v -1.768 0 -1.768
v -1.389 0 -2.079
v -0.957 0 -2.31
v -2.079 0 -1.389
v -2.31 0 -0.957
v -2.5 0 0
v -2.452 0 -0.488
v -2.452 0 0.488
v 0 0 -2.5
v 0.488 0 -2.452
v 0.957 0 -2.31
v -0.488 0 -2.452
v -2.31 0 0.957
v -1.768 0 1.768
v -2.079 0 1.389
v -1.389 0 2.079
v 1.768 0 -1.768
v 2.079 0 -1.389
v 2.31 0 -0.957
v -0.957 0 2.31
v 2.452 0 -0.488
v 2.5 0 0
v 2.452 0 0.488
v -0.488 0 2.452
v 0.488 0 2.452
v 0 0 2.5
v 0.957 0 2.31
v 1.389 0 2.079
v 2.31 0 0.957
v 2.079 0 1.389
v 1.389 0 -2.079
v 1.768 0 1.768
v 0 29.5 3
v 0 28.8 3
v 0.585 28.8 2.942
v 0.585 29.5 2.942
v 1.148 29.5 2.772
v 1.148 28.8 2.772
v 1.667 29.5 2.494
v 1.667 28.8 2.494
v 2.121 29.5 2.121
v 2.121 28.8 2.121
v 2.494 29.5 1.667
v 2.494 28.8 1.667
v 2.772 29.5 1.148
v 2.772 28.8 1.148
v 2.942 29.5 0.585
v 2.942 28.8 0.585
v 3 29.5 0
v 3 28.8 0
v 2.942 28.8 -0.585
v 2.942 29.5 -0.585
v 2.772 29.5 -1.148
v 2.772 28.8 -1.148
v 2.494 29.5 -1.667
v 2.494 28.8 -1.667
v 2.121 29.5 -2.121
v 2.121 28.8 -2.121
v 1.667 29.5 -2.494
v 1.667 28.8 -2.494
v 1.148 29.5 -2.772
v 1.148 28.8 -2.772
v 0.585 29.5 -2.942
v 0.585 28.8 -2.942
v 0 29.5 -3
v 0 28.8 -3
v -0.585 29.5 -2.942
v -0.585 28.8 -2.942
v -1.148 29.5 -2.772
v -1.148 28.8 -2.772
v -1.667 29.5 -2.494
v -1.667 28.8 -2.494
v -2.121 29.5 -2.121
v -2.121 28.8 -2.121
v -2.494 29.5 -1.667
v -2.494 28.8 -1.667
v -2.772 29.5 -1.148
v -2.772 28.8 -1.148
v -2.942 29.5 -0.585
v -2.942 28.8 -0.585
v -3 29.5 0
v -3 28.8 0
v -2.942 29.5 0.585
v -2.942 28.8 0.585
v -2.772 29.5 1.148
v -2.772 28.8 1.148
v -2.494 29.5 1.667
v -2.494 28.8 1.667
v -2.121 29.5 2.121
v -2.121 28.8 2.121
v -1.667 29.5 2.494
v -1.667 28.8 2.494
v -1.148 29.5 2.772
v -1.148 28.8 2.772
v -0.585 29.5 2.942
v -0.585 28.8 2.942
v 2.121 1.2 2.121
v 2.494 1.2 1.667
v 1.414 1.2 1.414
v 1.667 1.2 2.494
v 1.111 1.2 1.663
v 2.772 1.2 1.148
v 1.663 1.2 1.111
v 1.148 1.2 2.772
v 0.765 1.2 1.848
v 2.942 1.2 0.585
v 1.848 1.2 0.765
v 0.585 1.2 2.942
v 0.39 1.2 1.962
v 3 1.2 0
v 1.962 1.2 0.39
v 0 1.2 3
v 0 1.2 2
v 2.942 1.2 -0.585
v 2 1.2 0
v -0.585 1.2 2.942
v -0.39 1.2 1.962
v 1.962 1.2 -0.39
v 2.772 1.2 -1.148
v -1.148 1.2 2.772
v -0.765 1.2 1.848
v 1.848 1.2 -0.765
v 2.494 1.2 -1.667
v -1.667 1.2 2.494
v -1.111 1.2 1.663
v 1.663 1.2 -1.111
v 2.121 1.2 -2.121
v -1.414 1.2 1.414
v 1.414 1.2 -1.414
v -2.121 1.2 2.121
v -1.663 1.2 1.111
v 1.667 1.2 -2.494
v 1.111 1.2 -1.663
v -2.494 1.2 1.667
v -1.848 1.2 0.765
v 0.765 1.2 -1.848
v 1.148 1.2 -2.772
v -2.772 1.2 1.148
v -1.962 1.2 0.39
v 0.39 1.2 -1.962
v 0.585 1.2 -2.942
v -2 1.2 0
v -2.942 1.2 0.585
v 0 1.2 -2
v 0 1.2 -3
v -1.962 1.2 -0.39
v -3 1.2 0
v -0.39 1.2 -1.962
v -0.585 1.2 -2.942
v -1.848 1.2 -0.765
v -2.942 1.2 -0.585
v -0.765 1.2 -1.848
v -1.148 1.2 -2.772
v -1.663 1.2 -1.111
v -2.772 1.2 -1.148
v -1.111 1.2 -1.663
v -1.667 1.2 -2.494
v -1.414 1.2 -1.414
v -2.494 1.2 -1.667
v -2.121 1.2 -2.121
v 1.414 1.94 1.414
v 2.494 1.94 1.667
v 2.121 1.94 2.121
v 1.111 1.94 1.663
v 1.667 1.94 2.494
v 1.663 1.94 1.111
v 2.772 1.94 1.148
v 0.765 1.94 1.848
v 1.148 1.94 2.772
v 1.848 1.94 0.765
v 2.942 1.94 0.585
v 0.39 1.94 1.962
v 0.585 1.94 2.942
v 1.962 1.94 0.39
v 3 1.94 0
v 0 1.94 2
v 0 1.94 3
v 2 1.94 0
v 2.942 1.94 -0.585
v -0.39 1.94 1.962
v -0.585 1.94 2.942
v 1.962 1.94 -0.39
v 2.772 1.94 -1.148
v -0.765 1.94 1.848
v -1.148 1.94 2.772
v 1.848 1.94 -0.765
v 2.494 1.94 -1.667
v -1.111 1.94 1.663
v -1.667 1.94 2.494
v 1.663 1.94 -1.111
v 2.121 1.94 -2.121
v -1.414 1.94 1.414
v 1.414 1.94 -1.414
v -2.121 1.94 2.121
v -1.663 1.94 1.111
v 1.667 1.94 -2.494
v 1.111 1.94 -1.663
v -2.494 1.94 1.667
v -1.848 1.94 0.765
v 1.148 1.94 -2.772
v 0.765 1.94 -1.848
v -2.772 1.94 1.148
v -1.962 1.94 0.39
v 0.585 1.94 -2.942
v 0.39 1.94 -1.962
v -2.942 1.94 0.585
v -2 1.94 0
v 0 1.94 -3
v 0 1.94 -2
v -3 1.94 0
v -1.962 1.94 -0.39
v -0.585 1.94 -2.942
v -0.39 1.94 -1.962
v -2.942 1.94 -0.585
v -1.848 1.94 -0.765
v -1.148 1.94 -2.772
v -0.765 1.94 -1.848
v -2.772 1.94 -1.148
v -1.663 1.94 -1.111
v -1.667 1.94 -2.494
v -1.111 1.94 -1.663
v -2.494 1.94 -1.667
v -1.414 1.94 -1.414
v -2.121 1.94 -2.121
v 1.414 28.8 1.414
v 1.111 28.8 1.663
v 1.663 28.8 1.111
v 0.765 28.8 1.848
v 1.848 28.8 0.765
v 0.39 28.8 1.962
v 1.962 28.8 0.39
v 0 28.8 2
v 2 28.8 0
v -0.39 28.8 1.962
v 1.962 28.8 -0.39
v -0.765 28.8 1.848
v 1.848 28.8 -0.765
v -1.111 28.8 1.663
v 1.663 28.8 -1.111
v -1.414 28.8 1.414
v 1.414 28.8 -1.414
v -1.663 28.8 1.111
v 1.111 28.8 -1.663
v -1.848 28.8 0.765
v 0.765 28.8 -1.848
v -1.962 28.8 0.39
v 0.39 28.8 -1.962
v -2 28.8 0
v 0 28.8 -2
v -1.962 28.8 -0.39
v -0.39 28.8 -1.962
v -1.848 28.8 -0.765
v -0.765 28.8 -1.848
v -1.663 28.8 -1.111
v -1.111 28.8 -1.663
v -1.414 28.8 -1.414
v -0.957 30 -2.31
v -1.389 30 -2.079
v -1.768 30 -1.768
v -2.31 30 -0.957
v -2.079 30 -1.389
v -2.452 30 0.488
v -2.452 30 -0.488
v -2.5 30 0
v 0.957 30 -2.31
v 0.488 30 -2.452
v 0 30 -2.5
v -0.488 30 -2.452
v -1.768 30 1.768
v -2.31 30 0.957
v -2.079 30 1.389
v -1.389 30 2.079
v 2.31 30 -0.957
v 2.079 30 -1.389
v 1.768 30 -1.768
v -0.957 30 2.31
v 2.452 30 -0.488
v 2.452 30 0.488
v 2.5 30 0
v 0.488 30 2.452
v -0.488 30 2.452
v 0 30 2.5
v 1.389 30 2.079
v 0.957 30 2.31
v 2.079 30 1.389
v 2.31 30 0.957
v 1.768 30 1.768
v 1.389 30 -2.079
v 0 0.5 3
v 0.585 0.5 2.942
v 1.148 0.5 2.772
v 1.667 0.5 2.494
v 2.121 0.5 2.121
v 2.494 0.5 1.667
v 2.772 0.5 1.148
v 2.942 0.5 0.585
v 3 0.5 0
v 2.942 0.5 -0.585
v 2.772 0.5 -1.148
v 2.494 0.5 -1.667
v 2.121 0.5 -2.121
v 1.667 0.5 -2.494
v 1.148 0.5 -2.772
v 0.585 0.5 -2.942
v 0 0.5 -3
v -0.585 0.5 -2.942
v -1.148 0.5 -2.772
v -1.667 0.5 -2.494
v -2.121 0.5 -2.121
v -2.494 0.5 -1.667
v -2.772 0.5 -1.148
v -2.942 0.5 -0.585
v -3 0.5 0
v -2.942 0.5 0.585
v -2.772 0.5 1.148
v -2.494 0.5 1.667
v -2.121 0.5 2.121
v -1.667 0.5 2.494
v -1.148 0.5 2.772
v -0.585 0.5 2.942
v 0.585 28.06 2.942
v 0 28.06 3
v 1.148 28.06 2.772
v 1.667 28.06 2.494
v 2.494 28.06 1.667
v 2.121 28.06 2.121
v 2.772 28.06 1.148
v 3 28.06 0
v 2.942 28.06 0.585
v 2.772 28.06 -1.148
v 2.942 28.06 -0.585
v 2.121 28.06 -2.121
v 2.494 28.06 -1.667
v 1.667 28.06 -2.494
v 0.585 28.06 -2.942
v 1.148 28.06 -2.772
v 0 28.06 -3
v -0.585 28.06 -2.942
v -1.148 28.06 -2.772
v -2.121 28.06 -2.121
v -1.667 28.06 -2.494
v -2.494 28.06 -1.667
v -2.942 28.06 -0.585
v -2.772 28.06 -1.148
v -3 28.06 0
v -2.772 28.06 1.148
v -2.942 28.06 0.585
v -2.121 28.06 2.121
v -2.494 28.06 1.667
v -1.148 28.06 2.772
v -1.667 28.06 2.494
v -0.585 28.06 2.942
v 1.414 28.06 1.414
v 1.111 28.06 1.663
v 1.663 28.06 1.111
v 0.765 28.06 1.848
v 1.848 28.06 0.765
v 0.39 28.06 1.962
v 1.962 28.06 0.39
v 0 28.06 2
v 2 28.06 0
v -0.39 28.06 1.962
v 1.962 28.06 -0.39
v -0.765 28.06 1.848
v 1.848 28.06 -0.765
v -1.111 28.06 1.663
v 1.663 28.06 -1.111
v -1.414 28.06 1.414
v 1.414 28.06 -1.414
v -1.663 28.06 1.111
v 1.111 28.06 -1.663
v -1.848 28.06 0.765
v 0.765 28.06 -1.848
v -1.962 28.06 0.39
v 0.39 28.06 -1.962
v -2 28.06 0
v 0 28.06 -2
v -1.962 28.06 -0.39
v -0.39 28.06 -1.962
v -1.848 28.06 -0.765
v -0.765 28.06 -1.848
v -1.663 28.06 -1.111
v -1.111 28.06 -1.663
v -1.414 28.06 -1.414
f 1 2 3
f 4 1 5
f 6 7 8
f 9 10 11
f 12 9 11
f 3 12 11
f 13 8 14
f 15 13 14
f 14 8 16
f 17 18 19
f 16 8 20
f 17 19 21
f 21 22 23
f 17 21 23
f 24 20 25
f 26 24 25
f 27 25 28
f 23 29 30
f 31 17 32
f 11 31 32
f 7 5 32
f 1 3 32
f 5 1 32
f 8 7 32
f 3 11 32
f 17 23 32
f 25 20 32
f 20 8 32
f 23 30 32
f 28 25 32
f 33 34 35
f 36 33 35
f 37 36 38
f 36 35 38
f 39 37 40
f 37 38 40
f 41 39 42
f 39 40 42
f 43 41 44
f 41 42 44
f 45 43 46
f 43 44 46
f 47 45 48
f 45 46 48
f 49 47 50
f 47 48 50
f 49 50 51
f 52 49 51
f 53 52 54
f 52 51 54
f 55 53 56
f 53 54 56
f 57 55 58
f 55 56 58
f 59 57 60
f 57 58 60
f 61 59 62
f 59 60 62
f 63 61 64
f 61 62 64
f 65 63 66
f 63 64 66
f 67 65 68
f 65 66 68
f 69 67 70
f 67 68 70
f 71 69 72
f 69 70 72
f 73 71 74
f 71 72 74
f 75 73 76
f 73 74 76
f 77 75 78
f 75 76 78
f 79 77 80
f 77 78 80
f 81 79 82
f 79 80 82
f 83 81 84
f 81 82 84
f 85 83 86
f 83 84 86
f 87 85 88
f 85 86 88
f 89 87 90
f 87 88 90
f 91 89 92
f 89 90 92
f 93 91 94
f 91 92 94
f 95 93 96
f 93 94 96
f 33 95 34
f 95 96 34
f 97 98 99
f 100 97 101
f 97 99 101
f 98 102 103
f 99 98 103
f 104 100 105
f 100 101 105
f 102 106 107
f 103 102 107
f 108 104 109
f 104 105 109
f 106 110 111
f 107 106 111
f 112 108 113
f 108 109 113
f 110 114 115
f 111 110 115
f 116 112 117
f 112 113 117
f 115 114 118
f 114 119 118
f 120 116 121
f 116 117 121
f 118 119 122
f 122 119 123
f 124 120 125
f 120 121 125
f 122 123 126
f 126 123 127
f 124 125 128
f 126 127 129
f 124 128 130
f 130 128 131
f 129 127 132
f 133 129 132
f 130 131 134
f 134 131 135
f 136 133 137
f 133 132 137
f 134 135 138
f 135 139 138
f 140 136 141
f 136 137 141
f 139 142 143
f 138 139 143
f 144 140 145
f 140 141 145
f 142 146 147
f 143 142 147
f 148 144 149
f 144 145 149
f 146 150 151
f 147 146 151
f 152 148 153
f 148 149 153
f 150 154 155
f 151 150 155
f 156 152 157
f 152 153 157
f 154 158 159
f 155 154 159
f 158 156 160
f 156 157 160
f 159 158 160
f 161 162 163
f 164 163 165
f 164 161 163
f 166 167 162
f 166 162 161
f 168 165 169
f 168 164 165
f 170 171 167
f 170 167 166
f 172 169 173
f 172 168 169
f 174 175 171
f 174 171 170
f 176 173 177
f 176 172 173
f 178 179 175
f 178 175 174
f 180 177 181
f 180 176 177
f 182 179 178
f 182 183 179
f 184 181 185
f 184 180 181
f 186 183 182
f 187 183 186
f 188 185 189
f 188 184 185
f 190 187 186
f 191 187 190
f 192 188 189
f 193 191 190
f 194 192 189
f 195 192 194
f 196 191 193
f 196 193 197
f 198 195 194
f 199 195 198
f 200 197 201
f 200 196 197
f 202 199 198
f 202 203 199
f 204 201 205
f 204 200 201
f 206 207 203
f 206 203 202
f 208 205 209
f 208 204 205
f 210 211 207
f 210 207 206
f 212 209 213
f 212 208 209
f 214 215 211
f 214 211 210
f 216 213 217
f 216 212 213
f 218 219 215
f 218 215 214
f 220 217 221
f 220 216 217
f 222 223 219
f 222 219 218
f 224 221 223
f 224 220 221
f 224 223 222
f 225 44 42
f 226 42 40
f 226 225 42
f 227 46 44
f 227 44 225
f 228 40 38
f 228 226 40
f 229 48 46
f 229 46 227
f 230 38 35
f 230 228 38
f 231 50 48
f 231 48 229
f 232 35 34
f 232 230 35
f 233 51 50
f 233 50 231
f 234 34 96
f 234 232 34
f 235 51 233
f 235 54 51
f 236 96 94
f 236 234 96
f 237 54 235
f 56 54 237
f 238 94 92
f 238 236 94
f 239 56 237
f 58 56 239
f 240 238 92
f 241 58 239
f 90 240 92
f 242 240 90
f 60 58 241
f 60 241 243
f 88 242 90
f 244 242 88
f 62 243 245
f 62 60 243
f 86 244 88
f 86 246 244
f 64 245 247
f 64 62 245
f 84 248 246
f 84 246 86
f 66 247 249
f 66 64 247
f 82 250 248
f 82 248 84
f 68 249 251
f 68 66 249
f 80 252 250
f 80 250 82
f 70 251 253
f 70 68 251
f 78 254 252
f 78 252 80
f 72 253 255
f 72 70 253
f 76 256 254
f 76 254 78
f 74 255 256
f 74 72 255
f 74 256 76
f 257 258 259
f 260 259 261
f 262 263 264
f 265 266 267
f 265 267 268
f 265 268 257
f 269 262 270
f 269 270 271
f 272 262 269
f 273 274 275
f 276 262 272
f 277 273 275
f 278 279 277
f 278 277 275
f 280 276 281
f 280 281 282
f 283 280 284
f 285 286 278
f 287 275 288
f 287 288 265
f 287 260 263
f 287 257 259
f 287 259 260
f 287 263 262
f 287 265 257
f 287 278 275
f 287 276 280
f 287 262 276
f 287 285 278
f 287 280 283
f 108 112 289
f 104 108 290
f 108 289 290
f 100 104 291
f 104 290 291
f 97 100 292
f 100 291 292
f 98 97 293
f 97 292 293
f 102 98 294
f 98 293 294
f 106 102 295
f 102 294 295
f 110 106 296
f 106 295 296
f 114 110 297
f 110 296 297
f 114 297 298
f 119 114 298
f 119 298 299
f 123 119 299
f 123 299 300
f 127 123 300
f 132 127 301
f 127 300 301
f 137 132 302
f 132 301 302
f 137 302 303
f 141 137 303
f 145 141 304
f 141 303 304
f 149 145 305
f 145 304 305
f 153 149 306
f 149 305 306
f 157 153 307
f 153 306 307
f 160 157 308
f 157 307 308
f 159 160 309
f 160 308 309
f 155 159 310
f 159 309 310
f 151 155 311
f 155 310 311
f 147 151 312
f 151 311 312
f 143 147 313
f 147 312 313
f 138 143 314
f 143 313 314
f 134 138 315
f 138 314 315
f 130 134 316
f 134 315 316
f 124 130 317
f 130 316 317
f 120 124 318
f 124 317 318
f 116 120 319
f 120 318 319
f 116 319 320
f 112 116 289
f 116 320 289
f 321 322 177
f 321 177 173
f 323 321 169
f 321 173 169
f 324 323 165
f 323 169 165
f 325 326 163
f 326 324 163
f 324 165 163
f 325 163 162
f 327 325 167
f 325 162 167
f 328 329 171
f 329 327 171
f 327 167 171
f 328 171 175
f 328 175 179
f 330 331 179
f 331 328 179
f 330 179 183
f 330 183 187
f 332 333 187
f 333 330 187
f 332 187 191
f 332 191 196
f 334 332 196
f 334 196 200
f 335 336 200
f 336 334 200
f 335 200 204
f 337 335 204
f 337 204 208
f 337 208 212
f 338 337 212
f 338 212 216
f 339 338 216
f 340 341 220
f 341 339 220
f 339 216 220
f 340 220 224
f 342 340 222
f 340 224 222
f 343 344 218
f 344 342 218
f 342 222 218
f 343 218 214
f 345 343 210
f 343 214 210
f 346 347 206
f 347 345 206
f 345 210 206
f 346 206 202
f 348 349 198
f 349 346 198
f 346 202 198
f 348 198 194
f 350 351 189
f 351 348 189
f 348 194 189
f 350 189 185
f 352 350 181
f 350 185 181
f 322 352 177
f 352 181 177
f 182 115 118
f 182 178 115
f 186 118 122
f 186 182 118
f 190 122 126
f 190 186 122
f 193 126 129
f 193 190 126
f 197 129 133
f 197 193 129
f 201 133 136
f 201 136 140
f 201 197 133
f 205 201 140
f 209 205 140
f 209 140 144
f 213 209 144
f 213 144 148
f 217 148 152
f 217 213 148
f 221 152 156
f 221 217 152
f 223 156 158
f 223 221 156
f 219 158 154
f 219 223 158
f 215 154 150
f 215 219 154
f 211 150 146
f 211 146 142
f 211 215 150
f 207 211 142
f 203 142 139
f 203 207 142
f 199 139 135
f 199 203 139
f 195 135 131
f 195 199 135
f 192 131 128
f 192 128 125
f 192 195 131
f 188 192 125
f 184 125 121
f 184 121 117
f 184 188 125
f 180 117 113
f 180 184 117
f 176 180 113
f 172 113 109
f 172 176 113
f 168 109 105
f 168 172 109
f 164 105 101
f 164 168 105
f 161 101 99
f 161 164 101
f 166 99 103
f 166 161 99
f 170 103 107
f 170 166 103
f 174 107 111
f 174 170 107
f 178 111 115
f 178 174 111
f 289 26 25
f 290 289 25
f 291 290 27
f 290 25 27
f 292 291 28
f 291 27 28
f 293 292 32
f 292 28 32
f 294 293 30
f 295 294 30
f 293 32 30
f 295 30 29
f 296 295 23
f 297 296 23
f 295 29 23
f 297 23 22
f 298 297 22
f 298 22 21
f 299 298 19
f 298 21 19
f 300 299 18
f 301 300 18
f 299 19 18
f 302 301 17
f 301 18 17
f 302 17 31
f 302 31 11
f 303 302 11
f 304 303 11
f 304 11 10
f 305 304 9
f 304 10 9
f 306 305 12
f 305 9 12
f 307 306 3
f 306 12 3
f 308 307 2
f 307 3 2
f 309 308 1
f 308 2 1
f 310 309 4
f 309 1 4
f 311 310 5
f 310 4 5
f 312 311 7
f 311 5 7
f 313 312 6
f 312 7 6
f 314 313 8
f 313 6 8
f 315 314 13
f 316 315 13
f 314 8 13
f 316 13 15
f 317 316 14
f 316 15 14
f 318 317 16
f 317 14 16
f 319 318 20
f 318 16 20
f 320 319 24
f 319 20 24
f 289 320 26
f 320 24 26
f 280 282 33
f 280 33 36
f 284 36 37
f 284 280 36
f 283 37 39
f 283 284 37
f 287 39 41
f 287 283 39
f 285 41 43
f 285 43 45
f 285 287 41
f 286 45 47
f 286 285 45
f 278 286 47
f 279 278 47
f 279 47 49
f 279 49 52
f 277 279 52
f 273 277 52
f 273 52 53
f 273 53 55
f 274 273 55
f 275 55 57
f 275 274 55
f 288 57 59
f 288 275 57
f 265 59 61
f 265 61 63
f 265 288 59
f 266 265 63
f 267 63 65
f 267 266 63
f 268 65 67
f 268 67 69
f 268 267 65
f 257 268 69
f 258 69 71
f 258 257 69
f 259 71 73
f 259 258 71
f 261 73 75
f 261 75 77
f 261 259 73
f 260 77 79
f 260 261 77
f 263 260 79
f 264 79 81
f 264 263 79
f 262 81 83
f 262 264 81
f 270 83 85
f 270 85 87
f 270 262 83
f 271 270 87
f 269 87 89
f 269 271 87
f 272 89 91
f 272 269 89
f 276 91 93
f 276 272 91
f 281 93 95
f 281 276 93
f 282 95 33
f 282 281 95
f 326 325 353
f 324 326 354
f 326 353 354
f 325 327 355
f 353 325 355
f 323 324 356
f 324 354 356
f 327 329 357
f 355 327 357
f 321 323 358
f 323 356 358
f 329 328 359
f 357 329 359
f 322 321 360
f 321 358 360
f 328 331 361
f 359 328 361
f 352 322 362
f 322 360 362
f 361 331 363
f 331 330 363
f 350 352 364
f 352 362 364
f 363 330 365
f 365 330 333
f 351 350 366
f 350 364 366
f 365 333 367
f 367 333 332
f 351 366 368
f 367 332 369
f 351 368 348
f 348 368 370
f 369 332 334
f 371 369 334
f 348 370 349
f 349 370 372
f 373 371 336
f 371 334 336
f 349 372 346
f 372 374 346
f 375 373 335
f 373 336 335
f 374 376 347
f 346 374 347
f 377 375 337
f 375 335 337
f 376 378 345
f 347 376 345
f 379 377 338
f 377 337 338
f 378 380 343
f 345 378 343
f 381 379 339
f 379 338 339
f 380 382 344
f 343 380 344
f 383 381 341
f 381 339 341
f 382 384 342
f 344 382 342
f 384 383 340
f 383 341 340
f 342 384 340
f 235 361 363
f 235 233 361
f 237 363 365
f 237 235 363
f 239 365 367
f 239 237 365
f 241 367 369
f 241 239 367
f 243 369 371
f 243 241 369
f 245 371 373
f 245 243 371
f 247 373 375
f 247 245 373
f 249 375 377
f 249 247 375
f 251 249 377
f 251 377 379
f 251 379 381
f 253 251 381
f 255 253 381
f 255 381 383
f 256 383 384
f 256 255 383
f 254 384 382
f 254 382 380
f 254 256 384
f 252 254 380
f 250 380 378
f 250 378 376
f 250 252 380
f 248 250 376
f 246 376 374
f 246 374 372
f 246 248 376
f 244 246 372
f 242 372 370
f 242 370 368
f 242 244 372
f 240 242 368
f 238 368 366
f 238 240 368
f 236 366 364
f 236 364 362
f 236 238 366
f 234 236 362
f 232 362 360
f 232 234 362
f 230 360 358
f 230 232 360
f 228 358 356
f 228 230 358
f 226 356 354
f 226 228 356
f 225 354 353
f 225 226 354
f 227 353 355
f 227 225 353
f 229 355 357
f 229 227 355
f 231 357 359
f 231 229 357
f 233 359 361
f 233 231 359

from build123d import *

# Parameters (mm, degrees)
SKETCH1_R           = 3
BOSS_EXTRUDE1_DEPTH = 30
SKETCH2_W           = 1
SKETCH2_H           = 0.74
CHAMFER1_SIZE       = 0.5


with BuildPart() as part:
    # Sketch1 → Boss-Extrude1 (new body)
    with BuildSketch(Plane(origin=(0, 0, 0), x_dir=(1, 0, 0), z_dir=(0, 1, 0))):
        with Locations(Location((0, 0, 0), (0, 0, 270))):
            Circle(SKETCH1_R)
    extrude(amount=BOSS_EXTRUDE1_DEPTH)

    # Sketch2 → Cut-Revolve1 (revolve, cut)
    with BuildSketch(Plane.XY):
        with Locations((2.5, 28.43)):
            Rectangle(SKETCH2_W, SKETCH2_H)
        with Locations((2.5, 1.57)):
            Rectangle(SKETCH2_W, SKETCH2_H)
    revolve(axis=Axis((0, -1000, 0), (0, 1, 0)), mode=Mode.SUBTRACT)

    # Chamfer1
    chamfer1_edges = [part.edges().sort_by_distance(p)[0] for p in [
        (0, 0, -3),
        (0, 30, -3),
    ]]
    chamfer(chamfer1_edges, length=CHAMFER1_SIZE)


solid = part.part
